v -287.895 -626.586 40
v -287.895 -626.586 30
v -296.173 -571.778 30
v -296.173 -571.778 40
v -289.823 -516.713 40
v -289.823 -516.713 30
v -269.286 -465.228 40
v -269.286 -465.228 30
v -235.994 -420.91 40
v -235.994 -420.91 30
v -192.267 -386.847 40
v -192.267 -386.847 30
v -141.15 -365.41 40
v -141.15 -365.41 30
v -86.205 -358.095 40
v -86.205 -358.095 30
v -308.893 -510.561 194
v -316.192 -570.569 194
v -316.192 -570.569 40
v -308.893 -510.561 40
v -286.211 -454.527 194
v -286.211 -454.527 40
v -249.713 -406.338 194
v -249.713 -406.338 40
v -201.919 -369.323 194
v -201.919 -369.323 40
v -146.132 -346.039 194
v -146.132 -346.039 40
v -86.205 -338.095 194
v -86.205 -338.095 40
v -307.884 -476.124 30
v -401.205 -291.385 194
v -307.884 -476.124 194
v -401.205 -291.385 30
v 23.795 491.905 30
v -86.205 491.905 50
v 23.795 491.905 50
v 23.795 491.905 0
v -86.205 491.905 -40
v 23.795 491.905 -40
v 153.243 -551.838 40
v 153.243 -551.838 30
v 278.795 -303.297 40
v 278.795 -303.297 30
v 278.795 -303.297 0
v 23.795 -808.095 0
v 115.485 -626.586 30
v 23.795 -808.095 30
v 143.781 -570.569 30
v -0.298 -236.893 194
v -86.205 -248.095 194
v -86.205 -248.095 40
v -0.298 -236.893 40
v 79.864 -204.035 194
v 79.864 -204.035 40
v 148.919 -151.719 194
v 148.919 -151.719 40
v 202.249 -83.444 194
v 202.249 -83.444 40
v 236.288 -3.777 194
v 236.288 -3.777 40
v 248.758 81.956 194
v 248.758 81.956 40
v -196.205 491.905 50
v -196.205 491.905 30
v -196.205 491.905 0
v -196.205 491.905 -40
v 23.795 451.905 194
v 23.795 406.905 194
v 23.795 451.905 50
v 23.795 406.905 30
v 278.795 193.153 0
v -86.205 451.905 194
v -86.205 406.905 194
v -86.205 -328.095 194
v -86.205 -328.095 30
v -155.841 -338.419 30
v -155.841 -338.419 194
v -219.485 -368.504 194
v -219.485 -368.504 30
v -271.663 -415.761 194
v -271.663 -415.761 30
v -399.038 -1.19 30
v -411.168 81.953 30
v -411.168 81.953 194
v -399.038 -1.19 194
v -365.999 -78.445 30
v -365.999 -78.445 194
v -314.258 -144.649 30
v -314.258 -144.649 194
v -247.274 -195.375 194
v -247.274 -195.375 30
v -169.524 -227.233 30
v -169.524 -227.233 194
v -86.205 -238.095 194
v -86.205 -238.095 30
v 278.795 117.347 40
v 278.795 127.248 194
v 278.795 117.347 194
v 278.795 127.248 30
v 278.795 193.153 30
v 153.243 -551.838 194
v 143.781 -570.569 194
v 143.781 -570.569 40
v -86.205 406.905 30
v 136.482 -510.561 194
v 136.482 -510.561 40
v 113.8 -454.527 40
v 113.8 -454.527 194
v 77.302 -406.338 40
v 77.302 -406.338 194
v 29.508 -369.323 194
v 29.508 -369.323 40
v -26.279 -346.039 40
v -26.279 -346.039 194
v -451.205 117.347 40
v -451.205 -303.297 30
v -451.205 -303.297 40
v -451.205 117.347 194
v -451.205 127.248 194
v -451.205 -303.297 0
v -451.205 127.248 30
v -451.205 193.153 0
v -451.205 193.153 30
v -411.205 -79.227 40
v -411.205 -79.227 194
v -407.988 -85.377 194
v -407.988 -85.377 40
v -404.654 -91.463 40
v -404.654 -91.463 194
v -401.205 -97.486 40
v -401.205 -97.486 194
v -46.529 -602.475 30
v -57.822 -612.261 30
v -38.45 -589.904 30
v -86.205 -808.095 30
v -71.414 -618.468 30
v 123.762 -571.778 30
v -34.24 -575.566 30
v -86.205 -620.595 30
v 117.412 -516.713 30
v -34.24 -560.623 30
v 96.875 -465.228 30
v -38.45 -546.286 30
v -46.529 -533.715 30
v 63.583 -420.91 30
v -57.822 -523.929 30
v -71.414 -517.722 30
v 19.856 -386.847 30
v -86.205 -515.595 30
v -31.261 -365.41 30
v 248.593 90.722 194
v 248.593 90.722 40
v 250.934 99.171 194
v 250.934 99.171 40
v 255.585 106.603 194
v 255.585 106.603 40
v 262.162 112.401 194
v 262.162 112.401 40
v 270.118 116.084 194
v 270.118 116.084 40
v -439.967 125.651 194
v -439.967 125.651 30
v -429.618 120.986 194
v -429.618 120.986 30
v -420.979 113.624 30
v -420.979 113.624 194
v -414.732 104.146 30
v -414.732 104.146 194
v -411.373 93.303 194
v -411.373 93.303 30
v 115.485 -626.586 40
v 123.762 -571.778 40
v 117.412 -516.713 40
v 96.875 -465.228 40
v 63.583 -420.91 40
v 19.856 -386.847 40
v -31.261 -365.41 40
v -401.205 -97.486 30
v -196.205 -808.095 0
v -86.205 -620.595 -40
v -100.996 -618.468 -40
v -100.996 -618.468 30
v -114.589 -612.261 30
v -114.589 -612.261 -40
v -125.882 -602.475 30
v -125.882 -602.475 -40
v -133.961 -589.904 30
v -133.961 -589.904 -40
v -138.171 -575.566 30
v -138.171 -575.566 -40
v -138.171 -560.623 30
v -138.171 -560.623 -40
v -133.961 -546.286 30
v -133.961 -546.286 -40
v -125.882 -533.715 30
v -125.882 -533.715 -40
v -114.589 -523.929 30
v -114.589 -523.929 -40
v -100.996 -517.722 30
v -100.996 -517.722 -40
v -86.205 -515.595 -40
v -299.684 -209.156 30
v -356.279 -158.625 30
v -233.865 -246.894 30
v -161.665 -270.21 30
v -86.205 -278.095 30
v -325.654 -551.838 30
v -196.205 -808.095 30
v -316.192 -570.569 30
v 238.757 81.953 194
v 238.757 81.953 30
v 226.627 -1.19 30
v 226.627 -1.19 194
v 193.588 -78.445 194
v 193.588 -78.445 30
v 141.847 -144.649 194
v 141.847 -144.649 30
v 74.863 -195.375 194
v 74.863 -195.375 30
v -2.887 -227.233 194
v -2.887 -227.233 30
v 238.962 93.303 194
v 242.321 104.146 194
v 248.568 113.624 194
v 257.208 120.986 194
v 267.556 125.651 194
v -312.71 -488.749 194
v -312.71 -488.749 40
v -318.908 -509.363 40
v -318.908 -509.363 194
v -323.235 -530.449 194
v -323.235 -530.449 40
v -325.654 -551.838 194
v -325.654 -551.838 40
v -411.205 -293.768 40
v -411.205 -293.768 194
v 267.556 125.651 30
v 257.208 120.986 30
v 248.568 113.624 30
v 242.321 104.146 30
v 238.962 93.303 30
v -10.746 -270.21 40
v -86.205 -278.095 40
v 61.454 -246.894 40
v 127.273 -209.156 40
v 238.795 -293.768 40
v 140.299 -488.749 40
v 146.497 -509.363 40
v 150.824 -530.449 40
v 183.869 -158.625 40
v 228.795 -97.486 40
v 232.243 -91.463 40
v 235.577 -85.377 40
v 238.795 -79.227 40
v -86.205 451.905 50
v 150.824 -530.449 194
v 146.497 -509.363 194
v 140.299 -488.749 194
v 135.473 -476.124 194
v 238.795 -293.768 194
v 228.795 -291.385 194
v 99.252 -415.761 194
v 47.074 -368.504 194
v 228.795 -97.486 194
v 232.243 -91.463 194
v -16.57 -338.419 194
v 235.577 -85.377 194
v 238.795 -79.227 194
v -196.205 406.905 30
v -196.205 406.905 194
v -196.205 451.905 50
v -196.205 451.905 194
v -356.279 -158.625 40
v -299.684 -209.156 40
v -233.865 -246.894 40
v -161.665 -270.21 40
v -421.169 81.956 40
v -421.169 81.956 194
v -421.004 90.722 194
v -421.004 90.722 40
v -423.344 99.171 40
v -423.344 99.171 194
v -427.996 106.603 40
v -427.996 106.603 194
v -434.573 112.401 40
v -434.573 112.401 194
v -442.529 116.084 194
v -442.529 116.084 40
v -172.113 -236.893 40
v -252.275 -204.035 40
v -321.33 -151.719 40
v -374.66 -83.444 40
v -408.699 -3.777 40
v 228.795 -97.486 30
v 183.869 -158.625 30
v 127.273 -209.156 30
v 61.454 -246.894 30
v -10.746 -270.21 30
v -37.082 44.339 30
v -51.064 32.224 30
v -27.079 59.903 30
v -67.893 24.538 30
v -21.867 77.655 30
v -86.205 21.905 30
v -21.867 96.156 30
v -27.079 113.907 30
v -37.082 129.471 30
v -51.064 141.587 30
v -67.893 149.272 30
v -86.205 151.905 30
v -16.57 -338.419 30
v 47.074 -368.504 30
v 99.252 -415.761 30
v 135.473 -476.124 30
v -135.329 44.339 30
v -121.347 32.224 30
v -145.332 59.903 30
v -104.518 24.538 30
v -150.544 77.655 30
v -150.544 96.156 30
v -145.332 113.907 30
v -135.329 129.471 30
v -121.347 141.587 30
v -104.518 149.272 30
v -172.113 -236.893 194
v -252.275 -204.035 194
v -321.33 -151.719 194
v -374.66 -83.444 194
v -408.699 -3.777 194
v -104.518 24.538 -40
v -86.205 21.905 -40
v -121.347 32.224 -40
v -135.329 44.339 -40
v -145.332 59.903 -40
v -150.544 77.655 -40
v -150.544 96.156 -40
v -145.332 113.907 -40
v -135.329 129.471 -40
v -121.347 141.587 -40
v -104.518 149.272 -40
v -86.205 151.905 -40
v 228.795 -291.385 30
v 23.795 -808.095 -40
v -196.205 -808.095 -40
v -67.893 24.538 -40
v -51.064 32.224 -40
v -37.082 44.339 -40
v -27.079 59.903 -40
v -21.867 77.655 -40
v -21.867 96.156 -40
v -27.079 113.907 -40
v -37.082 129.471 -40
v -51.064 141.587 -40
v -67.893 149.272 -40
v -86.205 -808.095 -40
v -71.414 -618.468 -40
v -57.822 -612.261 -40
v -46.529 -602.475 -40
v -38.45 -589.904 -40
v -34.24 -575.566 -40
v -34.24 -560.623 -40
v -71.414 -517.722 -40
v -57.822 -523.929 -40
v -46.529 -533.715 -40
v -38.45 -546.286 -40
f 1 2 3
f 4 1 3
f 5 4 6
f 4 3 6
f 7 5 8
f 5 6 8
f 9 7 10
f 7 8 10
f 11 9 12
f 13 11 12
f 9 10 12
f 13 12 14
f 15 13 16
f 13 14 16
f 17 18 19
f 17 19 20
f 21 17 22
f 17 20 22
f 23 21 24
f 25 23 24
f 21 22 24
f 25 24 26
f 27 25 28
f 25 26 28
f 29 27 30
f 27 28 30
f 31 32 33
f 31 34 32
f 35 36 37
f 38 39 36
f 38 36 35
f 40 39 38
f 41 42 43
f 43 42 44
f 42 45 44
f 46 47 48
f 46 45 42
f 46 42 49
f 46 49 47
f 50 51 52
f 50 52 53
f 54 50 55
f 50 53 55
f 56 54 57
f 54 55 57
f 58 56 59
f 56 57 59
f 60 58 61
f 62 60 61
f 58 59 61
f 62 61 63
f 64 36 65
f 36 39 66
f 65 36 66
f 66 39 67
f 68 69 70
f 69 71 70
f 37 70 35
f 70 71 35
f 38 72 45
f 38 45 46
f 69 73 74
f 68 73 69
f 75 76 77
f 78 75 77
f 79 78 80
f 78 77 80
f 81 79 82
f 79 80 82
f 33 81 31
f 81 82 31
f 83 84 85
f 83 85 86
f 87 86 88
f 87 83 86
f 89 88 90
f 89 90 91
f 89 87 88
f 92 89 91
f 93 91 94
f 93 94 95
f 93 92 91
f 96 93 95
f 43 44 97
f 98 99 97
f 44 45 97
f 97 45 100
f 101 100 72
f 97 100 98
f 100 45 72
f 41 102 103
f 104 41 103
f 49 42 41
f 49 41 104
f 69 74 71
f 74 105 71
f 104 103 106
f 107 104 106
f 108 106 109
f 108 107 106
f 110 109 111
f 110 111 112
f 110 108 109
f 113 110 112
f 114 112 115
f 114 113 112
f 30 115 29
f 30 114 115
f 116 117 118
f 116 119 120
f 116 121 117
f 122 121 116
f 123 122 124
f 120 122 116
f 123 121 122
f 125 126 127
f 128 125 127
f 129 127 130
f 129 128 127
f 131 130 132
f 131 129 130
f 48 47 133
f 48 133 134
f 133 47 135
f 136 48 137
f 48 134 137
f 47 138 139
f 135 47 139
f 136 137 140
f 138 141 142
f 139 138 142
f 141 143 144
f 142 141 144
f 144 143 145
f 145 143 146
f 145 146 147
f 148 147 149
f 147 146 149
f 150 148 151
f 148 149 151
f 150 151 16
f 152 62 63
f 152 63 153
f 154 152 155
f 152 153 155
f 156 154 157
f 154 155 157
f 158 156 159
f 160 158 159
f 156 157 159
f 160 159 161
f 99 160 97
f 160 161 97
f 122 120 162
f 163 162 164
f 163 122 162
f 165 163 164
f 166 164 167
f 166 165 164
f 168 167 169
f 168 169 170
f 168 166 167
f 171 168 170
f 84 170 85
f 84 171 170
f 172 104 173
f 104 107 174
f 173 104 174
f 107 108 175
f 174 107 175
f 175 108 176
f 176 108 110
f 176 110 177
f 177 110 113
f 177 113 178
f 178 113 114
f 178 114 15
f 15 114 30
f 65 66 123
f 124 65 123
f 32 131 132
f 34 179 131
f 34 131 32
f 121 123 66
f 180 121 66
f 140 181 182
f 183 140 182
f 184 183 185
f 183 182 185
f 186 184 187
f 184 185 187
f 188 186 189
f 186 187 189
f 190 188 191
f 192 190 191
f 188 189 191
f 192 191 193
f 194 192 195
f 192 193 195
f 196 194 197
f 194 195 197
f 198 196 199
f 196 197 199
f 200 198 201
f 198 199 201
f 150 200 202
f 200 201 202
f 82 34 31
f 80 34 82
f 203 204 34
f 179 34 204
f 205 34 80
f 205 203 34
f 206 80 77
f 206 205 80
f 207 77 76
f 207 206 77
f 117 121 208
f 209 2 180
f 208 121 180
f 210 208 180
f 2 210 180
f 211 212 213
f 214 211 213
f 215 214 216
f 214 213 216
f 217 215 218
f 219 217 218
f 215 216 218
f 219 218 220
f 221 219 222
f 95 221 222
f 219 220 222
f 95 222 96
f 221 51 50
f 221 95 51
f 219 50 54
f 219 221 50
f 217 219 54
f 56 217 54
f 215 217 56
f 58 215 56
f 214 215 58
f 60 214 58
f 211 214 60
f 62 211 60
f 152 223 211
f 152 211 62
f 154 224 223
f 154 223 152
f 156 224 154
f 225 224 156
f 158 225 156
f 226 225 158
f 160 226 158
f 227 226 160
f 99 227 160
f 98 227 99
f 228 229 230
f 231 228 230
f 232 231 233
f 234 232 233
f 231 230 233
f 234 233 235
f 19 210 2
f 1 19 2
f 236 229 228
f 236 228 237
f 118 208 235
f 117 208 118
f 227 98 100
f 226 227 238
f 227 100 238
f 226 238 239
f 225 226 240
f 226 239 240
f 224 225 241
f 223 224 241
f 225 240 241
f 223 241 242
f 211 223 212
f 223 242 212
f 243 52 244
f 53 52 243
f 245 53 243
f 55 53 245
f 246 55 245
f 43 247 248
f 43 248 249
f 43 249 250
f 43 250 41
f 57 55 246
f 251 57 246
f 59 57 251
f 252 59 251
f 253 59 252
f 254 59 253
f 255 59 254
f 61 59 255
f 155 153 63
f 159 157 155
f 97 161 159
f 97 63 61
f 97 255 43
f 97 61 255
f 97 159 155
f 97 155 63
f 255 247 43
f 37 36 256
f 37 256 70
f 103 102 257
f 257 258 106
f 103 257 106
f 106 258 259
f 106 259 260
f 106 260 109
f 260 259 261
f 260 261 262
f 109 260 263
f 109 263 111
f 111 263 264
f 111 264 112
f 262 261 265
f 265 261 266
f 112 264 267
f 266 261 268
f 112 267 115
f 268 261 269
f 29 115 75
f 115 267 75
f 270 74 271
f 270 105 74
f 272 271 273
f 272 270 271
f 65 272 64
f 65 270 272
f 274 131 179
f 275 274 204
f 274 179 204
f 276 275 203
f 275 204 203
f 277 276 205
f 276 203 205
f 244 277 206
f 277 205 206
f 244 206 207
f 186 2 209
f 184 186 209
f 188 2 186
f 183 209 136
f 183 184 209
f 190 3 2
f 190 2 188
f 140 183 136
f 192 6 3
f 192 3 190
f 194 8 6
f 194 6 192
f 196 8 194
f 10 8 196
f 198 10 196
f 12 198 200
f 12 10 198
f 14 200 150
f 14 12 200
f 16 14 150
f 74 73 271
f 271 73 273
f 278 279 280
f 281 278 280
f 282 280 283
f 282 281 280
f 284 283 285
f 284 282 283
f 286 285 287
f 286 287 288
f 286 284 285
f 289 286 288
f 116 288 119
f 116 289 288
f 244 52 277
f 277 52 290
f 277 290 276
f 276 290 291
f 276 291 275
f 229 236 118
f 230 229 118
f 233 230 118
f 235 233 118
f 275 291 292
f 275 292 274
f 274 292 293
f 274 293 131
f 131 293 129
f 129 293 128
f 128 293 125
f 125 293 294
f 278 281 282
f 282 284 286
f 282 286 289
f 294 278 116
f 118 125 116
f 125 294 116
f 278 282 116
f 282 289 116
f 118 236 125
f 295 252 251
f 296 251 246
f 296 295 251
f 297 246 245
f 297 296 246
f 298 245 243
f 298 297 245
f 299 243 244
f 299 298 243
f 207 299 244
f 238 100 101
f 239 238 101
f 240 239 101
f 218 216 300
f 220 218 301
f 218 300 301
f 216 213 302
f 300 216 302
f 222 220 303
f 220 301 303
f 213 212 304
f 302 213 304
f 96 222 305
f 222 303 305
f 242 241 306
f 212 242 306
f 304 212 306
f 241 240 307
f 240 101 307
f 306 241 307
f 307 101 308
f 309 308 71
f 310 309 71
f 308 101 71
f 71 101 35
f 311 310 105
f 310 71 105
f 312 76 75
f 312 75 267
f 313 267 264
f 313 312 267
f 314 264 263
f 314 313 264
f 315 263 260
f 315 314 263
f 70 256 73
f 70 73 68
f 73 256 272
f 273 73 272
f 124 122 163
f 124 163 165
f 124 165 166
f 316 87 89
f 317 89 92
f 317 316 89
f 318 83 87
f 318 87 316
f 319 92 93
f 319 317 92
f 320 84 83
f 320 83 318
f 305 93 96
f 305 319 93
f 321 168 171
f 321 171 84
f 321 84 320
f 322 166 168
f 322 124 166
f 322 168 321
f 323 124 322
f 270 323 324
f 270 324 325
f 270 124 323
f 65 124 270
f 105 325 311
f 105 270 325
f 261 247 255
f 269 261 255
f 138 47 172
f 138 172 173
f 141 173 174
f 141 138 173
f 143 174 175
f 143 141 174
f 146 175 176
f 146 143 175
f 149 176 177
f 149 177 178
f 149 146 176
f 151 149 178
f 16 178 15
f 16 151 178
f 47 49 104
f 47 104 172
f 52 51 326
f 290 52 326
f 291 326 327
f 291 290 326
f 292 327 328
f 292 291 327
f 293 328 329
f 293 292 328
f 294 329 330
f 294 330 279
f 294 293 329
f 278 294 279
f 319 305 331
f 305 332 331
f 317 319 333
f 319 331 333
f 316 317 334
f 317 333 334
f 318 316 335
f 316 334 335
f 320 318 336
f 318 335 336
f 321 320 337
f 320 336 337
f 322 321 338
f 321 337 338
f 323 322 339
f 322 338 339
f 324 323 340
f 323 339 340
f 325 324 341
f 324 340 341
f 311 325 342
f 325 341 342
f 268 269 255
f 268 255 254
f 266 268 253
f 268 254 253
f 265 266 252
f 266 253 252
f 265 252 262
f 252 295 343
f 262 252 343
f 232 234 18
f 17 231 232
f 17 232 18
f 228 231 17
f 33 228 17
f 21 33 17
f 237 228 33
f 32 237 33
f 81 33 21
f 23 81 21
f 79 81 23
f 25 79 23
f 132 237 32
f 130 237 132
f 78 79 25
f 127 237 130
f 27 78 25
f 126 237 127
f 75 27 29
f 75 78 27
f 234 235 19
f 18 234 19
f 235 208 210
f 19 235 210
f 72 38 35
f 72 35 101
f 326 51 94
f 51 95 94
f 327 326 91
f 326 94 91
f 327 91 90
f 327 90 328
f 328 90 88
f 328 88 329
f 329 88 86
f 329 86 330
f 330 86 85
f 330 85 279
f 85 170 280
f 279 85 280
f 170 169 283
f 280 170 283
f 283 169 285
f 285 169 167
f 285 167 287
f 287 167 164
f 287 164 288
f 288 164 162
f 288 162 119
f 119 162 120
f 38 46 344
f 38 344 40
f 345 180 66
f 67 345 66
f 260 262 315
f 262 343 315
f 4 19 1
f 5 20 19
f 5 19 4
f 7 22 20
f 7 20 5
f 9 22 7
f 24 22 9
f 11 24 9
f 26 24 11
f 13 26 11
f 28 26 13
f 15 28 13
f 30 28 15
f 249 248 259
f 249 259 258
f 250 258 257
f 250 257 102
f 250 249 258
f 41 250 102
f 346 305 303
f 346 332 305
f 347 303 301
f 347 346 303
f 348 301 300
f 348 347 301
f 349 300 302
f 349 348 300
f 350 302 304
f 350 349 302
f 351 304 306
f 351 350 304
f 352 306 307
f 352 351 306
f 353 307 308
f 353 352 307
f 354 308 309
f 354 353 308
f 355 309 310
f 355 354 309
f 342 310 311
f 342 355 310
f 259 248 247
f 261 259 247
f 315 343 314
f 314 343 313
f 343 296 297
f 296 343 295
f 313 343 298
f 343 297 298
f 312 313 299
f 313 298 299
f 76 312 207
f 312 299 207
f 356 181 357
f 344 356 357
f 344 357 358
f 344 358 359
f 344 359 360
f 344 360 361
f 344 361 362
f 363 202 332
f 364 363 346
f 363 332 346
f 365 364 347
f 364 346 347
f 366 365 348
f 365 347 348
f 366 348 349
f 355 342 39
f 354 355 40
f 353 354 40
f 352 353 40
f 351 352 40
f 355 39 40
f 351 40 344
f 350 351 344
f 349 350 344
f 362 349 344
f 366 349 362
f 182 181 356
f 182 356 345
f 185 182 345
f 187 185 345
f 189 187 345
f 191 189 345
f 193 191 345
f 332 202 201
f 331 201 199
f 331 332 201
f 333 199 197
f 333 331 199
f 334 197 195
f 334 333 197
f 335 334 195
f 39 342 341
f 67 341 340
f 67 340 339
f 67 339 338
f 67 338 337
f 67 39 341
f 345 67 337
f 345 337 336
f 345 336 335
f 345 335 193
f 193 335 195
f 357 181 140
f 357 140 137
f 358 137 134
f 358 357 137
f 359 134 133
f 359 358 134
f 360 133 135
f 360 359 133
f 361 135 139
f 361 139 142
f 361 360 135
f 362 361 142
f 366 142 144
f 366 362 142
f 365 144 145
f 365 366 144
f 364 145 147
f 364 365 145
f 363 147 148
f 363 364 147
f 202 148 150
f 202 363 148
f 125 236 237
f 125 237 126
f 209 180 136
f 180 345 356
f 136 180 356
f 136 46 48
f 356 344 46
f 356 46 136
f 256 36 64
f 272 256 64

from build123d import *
from build123d.topology import SkipClean

# Parameters (mm, degrees)
PIASTRONEEXTR_DEPTH   = 30
LAMONE_DEPTH          = 40
CARTEREXT1_START      = 30
CARTEREXT1_DEPTH      = 10
CARTEREXT2_START      = 40
CARTEREXT2_DEPTH      = 154
IRRIGIDCIRC1_START    = 30
IRRIGIDCIRC1_DEPTH    = 10
IRRIGIDCIRC2_START    = 40
IRRIGIDCIRC2_DEPTH    = 154
IRRIGIDESTERNO1_START = 30
IRRIGIDESTERNO1_DEPTH = 10
IRRIGIDESTERNO2_START = 40
IRRIGIDESTERNO2_DEPTH = 154
RINFORZOSUP1_START    = 30
SKETCH12_W            = 110
SKETCH12_H            = 85
RINFORZOSUP1_DEPTH    = 20
BOSS_EXTRUDE1_START   = 50
SKETCH12_4_W          = 110
SKETCH12_4_H          = 45
BOSS_EXTRUDE1_DEPTH   = 144


with BuildPart() as part:
    # Piastrone → PiastroneExtr (new body)
    with BuildSketch(Plane.XY):
        with BuildLine():
            Line((-86.205427068, 491.905049747), (23.794572932, 491.905049747))
            Line((23.794572932, 491.905049747), (278.794572932, 193.153386451))
            Line((278.794572932, 193.153386451), (278.794572932, -303.297278914))
            Line((278.794572932, -303.297278914), (23.794572932, -808.094950253))
            Line((23.794572932, -808.094950253), (-86.205427068, -808.094950253))
            Line((-86.205427068, -808.094950253), (-86.205427068, -620.594950253))
            ThreePointArc((-86.205427068, -620.594950253), (-33.705427068, -568.094950253), (-86.205427068, -515.594950253))
            Line((-86.205427068, -515.594950253), (-86.205427068, 21.905049747))
            ThreePointArc((-86.205427068, 21.905049747), (-21.205427068, 86.905049747), (-86.205427068, 151.905049747))
            Line((-86.205427068, 151.905049747), (-86.205427068, 491.905049747))
        make_face()
    extrude(amount=PIASTRONEEXTR_DEPTH)


with BuildPart() as body_2:
    # Sketch14 → Lamone (new body)
    with BuildSketch(Plane(origin=(0, 0, 0), x_dir=(-1, 0, 0), z_dir=(0, 0, -1))):
        with BuildLine():
            Line((-23.794572932, 491.905049747), (86.205427068, 491.905049747))
            Line((86.205427068, 491.905049747), (86.205427068, 151.905049747))
            ThreePointArc((86.205427068, 151.905049747), (21.205427068, 86.905049747), (86.205427068, 21.905049747))
            Line((86.205427068, 21.905049747), (86.205427068, -515.594950253))
            ThreePointArc((86.205427068, -515.594950253), (33.705427068, -568.094950253), (86.205427068, -620.594950253))
            Line((86.205427068, -620.594950253), (86.205427068, -808.094950253))
            Line((86.205427068, -808.094950253), (-23.794572932, -808.094950253))
            Line((-23.794572932, -808.094950253), (-23.794572932, 491.905049747))
        make_face()
    extrude(amount=LAMONE_DEPTH)


with BuildPart() as body_3:
    # Carter → CarterExt1 (new body)
    with BuildSketch(Plane.XY.offset(CARTEREXT1_START)):
        with BuildLine():
            ThreePointArc((248.758008424, 81.95561707), (255.585083182, 106.603061749), (278.794572932, 117.346667498))
            Line((278.794572932, 117.346667498), (278.794572932, 86.905049747))
            ThreePointArc((278.794572932, 86.905049747), (171.888548065, -171.188925386), (-86.205427068, -278.094950253))
            Line((-86.205427068, -278.094950253), (-86.205427068, -248.094950253))
            ThreePointArc((-86.205427068, -248.094950253), (148.918944333, -151.719194564), (248.758008424, 81.95561707))
        make_face()
        with BuildLine():
            ThreePointArc((-86.205427068, -248.094950253), (148.918944333, -151.719194564), (248.758008424, 81.95561707))
            ThreePointArc((248.758008424, 81.95561707), (255.585083182, 106.603061749), (278.794572932, 117.346667498))
            Line((278.794572932, 117.346667498), (278.794572932, 127.247815787))
            ThreePointArc((278.794572932, 127.247815787), (248.567893296, 113.623706335), (238.756848588, 81.953342871))
            ThreePointArc((238.756848588, 81.953342871), (141.846864376, -144.648728817), (-86.205427068, -238.094950253))
            Line((-86.205427068, -238.094950253), (-86.205427068, -248.094950253))
        make_face()
    extrude(amount=CARTEREXT1_DEPTH)

    # Carter<4> → CarterExt2 (add)
    with BuildSketch(Plane.XY.offset(CARTEREXT2_START)):
        with BuildLine():
            ThreePointArc((-86.205427068, -248.094950253), (148.918944333, -151.719194564), (248.758008424, 81.95561707))
            ThreePointArc((248.758008424, 81.95561707), (255.585083182, 106.603061749), (278.794572932, 117.346667498))
            Line((278.794572932, 117.346667498), (278.794572932, 127.247815787))
            ThreePointArc((278.794572932, 127.247815787), (248.567893296, 113.623706335), (238.756848588, 81.953342871))
            ThreePointArc((238.756848588, 81.953342871), (141.846864376, -144.648728817), (-86.205427068, -238.094950253))
            Line((-86.205427068, -238.094950253), (-86.205427068, -248.094950253))
        make_face()
    extrude(amount=CARTEREXT2_DEPTH)


with BuildPart() as body_4:
    # IrrigidCirc → IrrigidCirc1 (new body)
    with BuildSketch(Plane.XY.offset(IRRIGIDCIRC1_START)):
        with BuildLine():
            ThreePointArc((-86.205427068, -338.094950253), (77.301662182, -406.337626569), (143.781261282, -570.569456643))
            Line((143.781261282, -570.569456643), (115.484539714, -626.585610189))
            ThreePointArc((115.484539714, -626.585610189), (81.697876334, -441.966124417), (-86.205427068, -358.094950253))
            Line((-86.205427068, -358.094950253), (-86.205427068, -338.094950253))
        make_face()
        with BuildLine():
            ThreePointArc((-86.205427068, -328.094950253), (77.651833725, -392.735895495), (153.243359331, -551.838299541))
            Line((153.243359331, -551.838299541), (143.781261282, -570.569456643))
            ThreePointArc((143.781261282, -570.569456643), (77.301662182, -406.337626569), (-86.205427068, -338.094950253))
            Line((-86.205427068, -338.094950253), (-86.205427068, -328.094950253))
        make_face()
    extrude(amount=IRRIGIDCIRC1_DEPTH)

    # IrrigidCirc<7> → IrrigidCirc2 (add)
    with BuildSketch(Plane.XY.offset(IRRIGIDCIRC2_START)):
        with BuildLine():
            ThreePointArc((-86.205427068, -328.094950253), (77.651833725, -392.735895495), (153.243359331, -551.838299541))
            Line((153.243359331, -551.838299541), (143.781261282, -570.569456643))
            ThreePointArc((143.781261282, -570.569456643), (77.301662182, -406.337626569), (-86.205427068, -338.094950253))
            Line((-86.205427068, -338.094950253), (-86.205427068, -328.094950253))
        make_face()
    extrude(amount=IRRIGIDCIRC2_DEPTH)


with BuildPart() as body_5:
    # Sketch9 → IrrigidEsterno1 (new body)
    with BuildSketch(Plane.XY.offset(IRRIGIDESTERNO1_START)):
        with BuildLine():
            Line((238.794572932, -293.767656293), (278.794572932, -303.297278914))
            Line((278.794572932, -303.297278914), (278.794572932, 86.905049747))
            ThreePointArc((278.794572932, 86.905049747), (268.653699911, 1.465012294), (238.794572932, -79.227427511))
            Line((238.794572932, -79.227427511), (238.794572932, -293.767656293))
        make_face()
        with BuildLine():
            Line((153.243359331, -551.838299541), (278.794572932, -303.297278914))
            Line((278.794572932, -303.297278914), (238.794572932, -293.767656293))
            Line((238.794572932, -293.767656293), (140.299029593, -488.749306939))
            ThreePointArc((140.299029593, -488.749306939), (148.897021721, -519.857635093), (153.243359331, -551.838299541))
        make_face()
        with BuildLine():
            Line((140.299029593, -488.749306939), (238.794572932, -293.767656293))
            Line((238.794572932, -293.767656293), (228.794572932, -291.385250638))
            Line((228.794572932, -291.385250638), (135.473141453, -476.124236116))
            ThreePointArc((135.473141453, -476.124236116), (137.974978228, -482.402792609), (140.299029593, -488.749306939))
        make_face()
        with BuildLine():
            Line((228.794572932, -291.385250638), (238.794572932, -293.767656293))
            Line((238.794572932, -293.767656293), (238.794572932, -79.227427511))
            ThreePointArc((238.794572932, -79.227427511), (233.924768948, -88.42794087), (228.794572932, -97.485839398))
            Line((228.794572932, -97.485839398), (228.794572932, -291.385250638))
        make_face()
    extrude(amount=IRRIGIDESTERNO1_DEPTH)

    # Sketch9<3> → IrrigidEsterno2 (add)
    with BuildSketch(Plane.XY.offset(IRRIGIDESTERNO2_START)):
        with BuildLine():
            Line((228.794572932, -291.385250638), (238.794572932, -293.767656293))
            Line((238.794572932, -293.767656293), (238.794572932, -79.227427511))
            ThreePointArc((238.794572932, -79.227427511), (233.924768948, -88.42794087), (228.794572932, -97.485839398))
            Line((228.794572932, -97.485839398), (228.794572932, -291.385250638))
        make_face()
        with BuildLine():
            Line((140.299029593, -488.749306939), (238.794572932, -293.767656293))
            Line((238.794572932, -293.767656293), (228.794572932, -291.385250638))
            Line((228.794572932, -291.385250638), (135.473141453, -476.124236116))
            ThreePointArc((135.473141453, -476.124236116), (137.974978228, -482.402792609), (140.299029593, -488.749306939))
        make_face()
    extrude(amount=IRRIGIDESTERNO2_DEPTH)


with BuildPart() as body_6:
    # Sketch12 → RinforzoSup1 (new body)
    with BuildSketch(Plane.XY.offset(RINFORZOSUP1_START)):
        with Locations((-31.205427068, 449.405049747)):
            Rectangle(SKETCH12_W, SKETCH12_H)
    extrude(amount=RINFORZOSUP1_DEPTH)

    # Sketch12<4> → Boss-Extrude1 (add)
    with BuildSketch(Plane.XY.offset(BOSS_EXTRUDE1_START)):
        with Locations((-31.205427068, 429.405049747)):
            Rectangle(SKETCH12_4_W, SKETCH12_4_H)
    extrude(amount=BOSS_EXTRUDE1_DEPTH)


with BuildPart() as body_2_1:
    add(body_2.part)

    # Combine11: union part, body 6, body 3, body 5, body 4
    add(part.part)
    add(body_6.part)
    add(body_3.part)
    add(body_5.part)
    add(body_4.part)

    # Mirror3: body 2 across plane


with BuildPart() as body_2_2:
    with SkipClean():  # the faces are left unmerged after this step: merging them gives an invalid solid
        add(body_2_1.part)
        add(body_2_1.part.mirror(Plane(origin=(-86.205427068, 491.905049747, -40), x_dir=(0, 0, 1), z_dir=(1, 0, 0))))


solid = body_2_2.part
